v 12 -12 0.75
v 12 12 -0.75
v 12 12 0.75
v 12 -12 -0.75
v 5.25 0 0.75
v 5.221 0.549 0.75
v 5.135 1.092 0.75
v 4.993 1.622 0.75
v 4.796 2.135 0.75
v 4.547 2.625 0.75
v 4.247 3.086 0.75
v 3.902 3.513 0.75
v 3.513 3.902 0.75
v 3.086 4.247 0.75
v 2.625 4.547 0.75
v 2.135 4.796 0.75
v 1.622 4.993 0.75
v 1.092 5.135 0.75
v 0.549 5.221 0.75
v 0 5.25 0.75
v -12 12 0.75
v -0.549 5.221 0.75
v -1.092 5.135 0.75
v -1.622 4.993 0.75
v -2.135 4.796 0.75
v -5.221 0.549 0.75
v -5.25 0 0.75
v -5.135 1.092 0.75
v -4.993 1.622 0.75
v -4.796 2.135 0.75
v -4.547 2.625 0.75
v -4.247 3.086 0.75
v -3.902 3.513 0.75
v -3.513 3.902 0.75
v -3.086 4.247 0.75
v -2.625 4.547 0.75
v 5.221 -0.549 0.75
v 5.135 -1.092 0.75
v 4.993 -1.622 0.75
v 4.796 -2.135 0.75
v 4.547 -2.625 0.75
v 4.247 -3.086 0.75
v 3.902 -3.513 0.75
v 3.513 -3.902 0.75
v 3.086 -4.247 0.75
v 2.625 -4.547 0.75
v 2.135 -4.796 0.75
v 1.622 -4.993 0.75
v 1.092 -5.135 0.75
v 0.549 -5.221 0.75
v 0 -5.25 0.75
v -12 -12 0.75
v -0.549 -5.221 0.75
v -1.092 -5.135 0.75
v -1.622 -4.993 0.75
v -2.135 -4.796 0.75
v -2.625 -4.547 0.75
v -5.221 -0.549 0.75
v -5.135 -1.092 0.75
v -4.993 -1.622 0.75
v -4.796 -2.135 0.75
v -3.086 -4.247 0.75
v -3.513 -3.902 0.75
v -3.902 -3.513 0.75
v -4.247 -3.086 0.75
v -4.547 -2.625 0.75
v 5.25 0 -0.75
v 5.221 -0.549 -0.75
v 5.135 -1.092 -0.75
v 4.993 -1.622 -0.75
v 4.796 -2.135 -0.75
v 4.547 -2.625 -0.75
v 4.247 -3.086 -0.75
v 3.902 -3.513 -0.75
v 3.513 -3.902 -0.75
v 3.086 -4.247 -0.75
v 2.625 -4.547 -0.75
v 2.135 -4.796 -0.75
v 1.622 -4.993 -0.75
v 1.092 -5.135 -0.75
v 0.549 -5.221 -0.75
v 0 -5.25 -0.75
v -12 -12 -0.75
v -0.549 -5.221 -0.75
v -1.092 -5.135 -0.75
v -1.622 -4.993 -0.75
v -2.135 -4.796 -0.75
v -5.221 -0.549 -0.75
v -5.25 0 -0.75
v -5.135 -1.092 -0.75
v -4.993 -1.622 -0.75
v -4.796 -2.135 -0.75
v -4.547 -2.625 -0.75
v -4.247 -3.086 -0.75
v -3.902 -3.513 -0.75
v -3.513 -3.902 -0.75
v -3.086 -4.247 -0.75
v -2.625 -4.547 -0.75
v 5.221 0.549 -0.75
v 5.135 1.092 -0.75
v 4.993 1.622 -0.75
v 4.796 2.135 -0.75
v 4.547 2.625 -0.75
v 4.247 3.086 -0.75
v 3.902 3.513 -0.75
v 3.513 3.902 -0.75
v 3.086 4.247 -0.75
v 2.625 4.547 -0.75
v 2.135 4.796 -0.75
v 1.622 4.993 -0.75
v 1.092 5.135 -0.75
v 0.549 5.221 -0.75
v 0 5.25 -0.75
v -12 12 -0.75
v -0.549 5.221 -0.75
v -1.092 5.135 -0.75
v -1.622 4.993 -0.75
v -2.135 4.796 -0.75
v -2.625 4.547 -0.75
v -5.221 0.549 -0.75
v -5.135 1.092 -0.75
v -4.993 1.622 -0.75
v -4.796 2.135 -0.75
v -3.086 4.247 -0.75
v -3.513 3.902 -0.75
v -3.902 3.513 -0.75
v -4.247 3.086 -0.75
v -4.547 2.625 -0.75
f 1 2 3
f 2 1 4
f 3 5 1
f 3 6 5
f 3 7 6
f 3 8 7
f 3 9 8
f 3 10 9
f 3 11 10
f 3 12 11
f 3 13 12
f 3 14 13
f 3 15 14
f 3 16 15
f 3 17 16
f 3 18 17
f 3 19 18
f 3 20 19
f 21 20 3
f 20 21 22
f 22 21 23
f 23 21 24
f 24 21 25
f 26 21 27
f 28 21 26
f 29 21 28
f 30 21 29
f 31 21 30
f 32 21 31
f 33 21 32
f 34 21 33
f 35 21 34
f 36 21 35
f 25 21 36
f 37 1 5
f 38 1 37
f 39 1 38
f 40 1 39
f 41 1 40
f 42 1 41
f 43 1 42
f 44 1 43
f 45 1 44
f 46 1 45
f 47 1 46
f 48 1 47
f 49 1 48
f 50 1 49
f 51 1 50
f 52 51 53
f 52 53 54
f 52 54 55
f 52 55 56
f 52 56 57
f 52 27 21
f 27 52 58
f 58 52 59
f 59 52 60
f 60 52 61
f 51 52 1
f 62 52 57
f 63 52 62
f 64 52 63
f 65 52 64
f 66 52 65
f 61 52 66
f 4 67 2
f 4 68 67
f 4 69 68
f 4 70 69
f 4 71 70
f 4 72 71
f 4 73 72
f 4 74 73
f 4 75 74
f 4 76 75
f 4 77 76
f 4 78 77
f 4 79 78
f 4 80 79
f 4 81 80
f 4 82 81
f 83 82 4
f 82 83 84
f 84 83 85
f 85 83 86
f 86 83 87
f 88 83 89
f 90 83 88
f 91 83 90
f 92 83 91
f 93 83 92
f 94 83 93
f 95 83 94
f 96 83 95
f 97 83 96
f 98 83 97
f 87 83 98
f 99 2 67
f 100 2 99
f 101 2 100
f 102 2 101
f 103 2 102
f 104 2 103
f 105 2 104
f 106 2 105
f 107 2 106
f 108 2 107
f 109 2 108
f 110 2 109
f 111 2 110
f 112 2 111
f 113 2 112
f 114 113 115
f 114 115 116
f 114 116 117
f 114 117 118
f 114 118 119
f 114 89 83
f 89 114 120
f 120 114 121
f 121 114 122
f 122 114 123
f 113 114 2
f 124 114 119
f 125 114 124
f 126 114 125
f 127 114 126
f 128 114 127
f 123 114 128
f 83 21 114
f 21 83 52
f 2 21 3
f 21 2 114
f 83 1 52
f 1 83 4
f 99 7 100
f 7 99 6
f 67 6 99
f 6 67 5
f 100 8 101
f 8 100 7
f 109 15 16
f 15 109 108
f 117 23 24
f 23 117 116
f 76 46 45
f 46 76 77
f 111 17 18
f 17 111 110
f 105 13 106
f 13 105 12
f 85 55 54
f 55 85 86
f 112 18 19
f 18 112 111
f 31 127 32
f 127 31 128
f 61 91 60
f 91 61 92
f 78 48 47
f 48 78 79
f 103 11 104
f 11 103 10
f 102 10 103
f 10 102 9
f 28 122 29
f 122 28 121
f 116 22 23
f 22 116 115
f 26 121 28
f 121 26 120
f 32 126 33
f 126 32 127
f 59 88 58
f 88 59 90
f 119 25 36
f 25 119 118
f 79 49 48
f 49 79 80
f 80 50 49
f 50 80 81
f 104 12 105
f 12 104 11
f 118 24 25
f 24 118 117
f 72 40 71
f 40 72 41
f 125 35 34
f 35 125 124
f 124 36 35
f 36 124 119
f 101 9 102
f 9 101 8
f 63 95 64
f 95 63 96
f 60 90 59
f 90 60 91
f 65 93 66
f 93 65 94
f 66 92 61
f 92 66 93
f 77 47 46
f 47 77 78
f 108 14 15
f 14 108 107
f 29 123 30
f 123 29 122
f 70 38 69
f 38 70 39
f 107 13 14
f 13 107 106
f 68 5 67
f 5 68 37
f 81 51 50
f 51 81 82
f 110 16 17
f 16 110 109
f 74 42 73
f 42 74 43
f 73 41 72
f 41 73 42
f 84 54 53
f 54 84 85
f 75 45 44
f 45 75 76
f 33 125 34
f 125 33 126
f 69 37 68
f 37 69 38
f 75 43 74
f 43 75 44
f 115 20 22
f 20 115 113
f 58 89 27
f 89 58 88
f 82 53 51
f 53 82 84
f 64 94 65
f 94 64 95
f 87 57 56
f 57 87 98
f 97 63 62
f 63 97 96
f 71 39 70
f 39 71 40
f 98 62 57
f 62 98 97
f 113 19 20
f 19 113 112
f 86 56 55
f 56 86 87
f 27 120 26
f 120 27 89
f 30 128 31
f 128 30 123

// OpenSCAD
// Square mounting washer.
$fn = 60;
eps = 0.02;
hole_d = 10.5;
side = 24;
thickness = 1.5;
difference() {
    cube([side,side,thickness],center=true);
    translate([0,0,-thickness/2-eps]) cylinder(d=hole_d,h=thickness+2*eps);
}
